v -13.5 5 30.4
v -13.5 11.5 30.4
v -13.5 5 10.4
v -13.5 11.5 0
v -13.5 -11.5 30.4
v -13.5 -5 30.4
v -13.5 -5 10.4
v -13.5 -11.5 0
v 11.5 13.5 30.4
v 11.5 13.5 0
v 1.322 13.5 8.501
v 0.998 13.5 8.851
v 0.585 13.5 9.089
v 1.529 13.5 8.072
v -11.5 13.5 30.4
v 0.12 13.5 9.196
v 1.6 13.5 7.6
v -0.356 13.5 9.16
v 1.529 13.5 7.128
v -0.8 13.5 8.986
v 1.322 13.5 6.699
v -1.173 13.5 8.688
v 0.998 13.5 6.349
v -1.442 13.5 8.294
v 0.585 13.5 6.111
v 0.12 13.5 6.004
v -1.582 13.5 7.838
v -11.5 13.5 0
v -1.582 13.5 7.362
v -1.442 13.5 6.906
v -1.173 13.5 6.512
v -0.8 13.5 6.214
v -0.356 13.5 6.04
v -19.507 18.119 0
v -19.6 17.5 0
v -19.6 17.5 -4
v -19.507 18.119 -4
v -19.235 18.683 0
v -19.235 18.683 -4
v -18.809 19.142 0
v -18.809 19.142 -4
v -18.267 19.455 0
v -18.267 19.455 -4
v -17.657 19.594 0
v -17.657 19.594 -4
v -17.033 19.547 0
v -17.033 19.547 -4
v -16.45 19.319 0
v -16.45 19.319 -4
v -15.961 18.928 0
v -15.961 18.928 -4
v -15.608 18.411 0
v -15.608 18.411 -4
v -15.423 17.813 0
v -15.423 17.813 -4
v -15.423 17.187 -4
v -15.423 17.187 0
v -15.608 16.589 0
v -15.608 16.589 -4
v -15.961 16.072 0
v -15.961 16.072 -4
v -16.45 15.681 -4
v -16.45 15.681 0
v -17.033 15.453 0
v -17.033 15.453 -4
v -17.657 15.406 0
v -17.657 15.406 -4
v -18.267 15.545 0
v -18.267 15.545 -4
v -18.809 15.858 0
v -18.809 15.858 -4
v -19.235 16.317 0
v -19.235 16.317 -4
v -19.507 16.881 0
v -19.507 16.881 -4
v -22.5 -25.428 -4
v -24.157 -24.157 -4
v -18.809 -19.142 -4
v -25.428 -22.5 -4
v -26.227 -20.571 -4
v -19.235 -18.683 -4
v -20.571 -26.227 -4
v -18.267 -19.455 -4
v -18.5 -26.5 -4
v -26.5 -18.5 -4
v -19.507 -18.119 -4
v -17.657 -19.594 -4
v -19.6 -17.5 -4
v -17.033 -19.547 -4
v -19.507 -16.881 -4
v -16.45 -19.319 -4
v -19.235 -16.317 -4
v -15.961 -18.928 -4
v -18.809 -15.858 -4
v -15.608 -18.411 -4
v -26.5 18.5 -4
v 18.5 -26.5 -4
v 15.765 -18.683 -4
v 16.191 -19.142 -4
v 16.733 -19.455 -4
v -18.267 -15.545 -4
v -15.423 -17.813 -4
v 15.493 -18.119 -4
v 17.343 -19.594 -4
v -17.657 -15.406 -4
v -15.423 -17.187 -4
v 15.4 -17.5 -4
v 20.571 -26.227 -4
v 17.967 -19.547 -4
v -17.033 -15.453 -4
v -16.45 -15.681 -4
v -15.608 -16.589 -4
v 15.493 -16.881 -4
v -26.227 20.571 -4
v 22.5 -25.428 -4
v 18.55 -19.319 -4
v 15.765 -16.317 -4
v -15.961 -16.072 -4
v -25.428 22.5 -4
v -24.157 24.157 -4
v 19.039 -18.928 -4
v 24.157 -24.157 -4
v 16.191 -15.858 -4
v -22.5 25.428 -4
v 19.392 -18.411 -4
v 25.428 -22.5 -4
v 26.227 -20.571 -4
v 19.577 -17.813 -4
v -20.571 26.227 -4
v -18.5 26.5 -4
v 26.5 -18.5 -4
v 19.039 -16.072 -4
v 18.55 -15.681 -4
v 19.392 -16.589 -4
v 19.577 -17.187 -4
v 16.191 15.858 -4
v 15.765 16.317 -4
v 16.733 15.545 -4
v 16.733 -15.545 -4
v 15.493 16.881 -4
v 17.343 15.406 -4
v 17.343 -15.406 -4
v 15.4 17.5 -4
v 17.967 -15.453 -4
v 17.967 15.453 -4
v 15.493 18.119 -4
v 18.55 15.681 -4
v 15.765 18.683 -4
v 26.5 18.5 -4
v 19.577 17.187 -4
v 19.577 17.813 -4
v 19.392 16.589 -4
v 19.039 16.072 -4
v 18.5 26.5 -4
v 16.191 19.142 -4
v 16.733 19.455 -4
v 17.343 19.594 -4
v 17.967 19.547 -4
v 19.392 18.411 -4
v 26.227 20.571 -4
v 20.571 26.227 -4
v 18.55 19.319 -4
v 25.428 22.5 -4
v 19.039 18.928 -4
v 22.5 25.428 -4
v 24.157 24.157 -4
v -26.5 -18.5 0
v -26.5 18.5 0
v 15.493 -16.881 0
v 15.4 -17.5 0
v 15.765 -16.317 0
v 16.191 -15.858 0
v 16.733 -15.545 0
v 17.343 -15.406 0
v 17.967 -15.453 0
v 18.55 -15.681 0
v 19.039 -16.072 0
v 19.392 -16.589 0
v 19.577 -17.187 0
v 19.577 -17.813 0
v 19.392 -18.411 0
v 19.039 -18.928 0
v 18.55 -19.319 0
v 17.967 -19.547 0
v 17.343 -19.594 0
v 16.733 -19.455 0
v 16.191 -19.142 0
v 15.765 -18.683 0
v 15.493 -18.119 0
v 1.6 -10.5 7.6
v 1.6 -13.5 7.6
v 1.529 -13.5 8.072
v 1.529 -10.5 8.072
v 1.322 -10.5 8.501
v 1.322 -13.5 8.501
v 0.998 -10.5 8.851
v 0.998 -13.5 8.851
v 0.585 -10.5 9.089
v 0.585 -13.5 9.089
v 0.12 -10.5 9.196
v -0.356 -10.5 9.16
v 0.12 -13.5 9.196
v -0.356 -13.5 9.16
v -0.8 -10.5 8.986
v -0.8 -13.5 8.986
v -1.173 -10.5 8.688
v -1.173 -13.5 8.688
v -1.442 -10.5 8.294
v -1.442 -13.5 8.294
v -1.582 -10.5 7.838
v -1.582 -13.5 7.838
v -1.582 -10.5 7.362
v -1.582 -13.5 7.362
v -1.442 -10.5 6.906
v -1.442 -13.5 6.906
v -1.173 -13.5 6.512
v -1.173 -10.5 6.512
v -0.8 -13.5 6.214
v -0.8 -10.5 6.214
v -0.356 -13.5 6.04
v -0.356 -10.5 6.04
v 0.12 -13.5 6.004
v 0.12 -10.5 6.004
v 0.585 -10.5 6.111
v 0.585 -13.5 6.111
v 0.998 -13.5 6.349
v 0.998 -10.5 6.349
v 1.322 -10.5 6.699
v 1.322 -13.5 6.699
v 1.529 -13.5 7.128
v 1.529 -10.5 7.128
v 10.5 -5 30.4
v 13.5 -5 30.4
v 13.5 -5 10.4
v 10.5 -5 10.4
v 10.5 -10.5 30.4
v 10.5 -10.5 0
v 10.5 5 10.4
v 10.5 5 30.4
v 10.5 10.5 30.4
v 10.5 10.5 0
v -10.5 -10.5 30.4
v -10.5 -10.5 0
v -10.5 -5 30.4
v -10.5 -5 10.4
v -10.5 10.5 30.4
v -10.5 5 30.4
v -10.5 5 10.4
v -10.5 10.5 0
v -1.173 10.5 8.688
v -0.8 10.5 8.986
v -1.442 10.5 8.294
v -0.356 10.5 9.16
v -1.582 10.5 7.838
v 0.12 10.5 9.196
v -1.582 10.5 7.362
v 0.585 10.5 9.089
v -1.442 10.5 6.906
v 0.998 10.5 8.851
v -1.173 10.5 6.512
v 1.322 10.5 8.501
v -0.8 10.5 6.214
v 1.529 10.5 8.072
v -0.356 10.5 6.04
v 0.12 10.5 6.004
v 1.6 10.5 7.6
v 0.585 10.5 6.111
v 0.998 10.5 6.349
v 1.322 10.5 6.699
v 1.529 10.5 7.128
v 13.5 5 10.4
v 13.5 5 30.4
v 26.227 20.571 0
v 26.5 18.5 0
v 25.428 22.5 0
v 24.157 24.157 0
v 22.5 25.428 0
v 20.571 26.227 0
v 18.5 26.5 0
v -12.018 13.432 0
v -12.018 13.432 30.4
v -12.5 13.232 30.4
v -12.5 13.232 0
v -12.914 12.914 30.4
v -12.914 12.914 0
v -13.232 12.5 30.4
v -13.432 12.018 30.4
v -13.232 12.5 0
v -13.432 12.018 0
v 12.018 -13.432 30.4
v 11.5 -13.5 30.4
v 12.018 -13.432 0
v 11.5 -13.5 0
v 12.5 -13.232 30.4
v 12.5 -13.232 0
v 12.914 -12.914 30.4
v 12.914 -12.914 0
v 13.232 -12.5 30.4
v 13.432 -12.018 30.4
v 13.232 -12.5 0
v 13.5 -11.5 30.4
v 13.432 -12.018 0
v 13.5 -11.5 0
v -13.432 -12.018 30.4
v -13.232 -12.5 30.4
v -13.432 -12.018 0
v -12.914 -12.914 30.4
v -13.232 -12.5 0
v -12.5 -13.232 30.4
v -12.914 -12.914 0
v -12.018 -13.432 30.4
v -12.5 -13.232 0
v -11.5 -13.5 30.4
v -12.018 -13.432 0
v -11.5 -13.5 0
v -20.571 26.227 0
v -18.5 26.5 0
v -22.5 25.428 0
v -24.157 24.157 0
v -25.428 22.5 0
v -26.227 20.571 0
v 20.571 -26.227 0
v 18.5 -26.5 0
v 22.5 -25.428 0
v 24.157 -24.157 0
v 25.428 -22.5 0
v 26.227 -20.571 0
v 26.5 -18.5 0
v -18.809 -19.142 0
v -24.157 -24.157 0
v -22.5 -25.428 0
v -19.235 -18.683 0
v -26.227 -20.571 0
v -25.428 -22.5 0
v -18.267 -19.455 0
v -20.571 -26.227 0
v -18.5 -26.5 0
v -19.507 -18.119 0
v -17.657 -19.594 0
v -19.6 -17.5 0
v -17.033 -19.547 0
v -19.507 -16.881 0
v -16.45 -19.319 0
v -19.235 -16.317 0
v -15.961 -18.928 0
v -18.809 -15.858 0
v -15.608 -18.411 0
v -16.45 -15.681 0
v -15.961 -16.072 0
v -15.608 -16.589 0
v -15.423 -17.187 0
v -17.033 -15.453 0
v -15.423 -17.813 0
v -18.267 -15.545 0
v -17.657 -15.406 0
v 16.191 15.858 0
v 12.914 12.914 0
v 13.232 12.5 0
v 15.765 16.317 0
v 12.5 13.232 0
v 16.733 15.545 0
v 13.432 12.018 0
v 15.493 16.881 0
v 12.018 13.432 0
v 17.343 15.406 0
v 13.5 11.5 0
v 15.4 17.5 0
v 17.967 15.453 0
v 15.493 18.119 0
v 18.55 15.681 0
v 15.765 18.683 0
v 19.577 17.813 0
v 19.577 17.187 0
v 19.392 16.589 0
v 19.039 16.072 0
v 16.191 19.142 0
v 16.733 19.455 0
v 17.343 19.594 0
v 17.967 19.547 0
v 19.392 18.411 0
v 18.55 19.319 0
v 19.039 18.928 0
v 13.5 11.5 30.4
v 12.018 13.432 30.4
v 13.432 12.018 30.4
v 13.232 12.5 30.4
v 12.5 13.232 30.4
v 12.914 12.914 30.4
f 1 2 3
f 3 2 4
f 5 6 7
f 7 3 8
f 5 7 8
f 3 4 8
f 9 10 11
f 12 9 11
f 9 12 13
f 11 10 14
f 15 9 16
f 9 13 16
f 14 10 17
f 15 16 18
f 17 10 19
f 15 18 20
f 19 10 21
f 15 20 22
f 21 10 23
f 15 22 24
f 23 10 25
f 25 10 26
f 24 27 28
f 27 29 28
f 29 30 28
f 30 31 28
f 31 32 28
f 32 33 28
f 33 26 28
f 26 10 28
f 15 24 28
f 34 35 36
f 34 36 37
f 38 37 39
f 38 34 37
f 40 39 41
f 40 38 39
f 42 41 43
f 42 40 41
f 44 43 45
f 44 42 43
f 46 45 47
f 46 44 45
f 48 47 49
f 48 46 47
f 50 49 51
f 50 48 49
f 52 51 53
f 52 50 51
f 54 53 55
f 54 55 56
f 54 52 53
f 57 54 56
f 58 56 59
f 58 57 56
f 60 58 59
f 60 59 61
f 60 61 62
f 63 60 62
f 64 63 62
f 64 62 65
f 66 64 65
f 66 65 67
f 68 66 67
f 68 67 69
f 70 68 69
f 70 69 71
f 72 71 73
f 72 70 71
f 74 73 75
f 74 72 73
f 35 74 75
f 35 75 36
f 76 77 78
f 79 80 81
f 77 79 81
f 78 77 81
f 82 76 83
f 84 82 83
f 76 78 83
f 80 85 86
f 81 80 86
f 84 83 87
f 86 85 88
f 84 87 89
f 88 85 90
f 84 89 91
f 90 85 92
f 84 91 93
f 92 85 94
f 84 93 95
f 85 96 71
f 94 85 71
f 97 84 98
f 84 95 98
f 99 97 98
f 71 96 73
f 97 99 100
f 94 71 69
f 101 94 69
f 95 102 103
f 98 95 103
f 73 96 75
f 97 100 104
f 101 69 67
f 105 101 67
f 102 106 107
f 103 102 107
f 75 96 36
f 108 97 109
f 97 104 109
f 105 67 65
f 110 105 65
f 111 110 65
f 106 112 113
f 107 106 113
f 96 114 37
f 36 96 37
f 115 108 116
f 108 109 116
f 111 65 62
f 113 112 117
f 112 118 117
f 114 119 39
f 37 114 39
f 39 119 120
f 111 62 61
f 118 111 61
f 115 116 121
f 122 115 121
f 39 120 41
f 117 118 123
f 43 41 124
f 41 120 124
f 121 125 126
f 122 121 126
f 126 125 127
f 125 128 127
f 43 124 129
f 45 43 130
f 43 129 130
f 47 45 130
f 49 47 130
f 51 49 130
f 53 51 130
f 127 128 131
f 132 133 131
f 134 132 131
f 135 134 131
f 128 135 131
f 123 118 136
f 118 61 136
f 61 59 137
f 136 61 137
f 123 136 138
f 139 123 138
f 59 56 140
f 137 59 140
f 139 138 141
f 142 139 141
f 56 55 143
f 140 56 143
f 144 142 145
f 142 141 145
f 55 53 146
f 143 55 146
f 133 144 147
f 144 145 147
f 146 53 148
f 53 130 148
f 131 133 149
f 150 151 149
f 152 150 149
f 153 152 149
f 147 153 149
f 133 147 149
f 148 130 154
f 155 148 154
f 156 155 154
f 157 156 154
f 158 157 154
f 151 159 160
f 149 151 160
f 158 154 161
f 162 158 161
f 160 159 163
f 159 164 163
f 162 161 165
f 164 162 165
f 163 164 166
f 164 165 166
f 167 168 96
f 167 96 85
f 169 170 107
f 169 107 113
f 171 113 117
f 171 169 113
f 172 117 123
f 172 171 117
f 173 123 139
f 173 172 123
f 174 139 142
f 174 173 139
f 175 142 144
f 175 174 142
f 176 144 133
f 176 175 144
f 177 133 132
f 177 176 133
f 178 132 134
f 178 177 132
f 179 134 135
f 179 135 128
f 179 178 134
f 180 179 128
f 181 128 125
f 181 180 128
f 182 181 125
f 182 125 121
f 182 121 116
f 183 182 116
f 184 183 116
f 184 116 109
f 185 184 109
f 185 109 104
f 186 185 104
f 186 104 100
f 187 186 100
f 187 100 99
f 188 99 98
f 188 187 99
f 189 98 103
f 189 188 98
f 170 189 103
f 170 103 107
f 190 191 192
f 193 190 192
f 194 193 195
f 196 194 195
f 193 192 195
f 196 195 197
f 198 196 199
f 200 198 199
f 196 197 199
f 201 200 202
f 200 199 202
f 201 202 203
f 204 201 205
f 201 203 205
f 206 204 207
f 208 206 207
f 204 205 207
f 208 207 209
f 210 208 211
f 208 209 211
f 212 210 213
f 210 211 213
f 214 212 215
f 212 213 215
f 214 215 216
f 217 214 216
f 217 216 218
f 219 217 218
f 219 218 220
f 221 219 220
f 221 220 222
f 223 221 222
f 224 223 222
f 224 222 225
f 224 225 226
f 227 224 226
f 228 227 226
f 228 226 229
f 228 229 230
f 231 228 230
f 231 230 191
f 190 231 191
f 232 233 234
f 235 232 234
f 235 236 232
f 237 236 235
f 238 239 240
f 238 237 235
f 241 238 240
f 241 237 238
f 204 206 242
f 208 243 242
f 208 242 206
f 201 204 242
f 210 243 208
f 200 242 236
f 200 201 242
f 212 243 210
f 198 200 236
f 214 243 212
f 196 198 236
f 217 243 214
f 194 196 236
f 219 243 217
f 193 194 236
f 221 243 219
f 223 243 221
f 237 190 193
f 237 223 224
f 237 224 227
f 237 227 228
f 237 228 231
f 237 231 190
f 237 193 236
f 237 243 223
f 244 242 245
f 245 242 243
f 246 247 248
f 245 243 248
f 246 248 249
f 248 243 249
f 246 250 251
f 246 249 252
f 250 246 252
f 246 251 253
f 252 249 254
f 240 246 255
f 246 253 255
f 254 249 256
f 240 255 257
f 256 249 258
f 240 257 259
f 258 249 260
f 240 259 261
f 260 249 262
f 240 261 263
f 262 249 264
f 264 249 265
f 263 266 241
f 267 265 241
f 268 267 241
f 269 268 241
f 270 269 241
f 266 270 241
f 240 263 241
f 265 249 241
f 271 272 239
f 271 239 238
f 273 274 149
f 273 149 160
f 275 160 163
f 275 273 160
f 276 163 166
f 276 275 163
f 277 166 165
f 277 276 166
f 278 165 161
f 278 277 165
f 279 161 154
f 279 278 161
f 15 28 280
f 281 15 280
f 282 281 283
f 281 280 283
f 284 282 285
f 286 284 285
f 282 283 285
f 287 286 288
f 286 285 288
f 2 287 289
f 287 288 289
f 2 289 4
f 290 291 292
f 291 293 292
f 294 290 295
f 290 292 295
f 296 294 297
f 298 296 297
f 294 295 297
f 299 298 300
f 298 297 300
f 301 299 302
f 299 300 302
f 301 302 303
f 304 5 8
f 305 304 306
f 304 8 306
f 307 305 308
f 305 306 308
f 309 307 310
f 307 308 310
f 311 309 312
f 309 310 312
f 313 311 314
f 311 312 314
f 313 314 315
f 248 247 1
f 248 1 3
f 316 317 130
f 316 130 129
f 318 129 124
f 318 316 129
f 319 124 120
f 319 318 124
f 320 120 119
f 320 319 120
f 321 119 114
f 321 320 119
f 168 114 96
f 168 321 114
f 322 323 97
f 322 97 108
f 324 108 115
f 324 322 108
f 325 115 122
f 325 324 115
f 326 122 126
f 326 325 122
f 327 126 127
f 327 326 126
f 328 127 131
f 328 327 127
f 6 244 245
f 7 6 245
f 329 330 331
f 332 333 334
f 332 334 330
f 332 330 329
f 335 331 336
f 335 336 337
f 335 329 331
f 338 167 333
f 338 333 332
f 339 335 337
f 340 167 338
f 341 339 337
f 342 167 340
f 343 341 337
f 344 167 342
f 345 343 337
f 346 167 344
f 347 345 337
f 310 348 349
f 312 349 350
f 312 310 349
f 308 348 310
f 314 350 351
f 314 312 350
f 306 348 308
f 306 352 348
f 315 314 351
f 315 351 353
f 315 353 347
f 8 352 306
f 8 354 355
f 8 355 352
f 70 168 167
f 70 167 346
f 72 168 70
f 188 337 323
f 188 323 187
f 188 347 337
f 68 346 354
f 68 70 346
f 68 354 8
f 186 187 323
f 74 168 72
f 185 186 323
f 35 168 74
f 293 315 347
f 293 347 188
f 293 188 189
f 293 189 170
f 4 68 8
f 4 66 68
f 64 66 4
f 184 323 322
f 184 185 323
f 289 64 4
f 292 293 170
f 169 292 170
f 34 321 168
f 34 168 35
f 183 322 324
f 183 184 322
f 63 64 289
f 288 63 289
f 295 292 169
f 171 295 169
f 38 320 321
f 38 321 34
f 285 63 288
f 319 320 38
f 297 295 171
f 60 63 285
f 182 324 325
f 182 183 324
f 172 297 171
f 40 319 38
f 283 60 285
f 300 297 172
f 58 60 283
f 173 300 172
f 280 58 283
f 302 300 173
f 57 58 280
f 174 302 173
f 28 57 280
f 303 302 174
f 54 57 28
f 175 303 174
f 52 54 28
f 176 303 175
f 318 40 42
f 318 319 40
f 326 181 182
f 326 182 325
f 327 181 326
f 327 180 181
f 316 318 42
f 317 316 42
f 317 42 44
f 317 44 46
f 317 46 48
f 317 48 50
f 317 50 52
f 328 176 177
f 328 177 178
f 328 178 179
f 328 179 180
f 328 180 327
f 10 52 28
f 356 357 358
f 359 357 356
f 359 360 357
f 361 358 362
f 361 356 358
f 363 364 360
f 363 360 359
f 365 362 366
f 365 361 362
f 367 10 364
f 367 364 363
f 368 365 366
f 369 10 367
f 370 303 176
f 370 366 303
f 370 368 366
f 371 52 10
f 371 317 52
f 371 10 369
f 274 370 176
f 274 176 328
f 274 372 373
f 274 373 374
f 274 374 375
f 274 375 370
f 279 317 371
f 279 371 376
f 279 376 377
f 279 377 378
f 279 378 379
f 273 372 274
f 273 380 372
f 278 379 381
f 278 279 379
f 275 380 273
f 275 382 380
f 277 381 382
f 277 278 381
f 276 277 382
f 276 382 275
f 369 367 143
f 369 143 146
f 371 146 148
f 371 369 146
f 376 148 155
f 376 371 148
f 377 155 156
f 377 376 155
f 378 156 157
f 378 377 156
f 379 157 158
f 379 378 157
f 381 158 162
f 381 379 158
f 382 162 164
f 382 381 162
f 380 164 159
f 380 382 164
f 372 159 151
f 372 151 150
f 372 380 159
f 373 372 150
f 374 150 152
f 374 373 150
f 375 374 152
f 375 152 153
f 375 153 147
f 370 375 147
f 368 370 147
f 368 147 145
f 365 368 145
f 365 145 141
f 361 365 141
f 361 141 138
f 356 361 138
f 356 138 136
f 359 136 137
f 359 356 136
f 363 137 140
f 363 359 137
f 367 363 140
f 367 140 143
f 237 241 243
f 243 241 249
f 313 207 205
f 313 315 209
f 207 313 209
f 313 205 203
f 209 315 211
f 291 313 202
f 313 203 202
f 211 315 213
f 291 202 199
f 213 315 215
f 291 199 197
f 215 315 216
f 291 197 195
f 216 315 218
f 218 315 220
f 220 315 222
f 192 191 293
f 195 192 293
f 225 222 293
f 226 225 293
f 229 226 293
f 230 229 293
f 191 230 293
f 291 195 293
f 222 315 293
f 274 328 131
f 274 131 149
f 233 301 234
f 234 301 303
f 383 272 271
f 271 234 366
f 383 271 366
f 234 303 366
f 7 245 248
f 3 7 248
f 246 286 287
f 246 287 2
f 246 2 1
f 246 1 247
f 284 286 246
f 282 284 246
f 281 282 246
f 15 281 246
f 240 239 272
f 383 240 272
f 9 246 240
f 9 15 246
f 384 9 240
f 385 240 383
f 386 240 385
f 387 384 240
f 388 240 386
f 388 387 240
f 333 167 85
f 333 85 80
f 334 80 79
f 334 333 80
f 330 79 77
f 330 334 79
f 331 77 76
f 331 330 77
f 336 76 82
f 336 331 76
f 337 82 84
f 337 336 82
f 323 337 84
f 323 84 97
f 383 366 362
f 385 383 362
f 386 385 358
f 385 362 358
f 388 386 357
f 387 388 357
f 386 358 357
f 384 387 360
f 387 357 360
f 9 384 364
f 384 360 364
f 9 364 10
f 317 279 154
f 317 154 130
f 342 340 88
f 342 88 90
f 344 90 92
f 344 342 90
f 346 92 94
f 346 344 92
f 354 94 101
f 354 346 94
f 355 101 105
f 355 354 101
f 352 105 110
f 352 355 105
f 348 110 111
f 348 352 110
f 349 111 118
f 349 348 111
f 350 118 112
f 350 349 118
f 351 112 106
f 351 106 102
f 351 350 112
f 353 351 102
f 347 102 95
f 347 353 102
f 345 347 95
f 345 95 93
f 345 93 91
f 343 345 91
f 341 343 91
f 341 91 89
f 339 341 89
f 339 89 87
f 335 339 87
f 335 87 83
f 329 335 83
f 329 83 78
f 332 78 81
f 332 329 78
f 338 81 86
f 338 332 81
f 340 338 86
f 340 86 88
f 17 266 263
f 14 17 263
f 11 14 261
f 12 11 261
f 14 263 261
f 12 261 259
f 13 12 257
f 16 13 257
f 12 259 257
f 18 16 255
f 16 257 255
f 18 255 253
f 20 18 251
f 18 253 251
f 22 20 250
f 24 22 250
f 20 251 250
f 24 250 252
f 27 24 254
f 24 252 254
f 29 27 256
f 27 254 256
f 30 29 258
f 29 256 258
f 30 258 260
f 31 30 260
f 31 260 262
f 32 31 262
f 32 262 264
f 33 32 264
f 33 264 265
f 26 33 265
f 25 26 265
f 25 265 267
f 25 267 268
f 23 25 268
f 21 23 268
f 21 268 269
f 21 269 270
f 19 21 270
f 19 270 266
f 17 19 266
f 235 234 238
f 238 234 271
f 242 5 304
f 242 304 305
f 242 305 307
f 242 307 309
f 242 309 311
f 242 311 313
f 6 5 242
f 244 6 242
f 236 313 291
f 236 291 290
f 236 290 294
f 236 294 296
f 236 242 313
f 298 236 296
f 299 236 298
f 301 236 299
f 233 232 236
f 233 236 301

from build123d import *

# Parameters (mm, degrees)
SKETCH1_W           = 27
SKETCH1_H           = 27
SKETCH1_W_2         = 21
SKETCH1_H_2         = 21
BOSS_EXTRUDE1_DEPTH = 15.2
SKETCH2_R           = 1.6
CUT_EXTRUDE1_DEPTH  = 34.797780992
SKETCH5_R           = 2.1
SKETCH5_W           = 27
SKETCH5_H           = 27
SKETCH5_W_2         = 21
SKETCH5_H_2         = 21
BOSS_EXTRUDE3_DEPTH = 4
FILLET2_R           = 2
BOSS_EXTRUDE5_DEPTH = 4
SKETCH8_W           = 21
SKETCH8_H           = 21
BOSS_EXTRUDE7_DEPTH = 15.2
SKETCH9_W           = 20
SKETCH9_H           = 10
CUT_EXTRUDE2_DEPTH  = 57.801496459


with BuildPart() as part:
    # Sketch1 → Boss-Extrude1 (new body)
    with BuildSketch(Plane.XY):
        Rectangle(SKETCH1_W, SKETCH1_H)
        Rectangle(SKETCH1_W_2, SKETCH1_H_2, mode=Mode.SUBTRACT)
    extrude(amount=BOSS_EXTRUDE1_DEPTH)

    # Sketch2 → Cut-Extrude1 (cut, through all)
    with BuildSketch(Plane.XZ.offset(13.5)):
        with Locations((0, 7.6)):
            Circle(SKETCH2_R)
    extrude(amount=-CUT_EXTRUDE1_DEPTH, mode=Mode.SUBTRACT)

    # Sketch5 → Boss-Extrude3 (add)
    with BuildSketch(Plane(origin=(0, 0, 0), x_dir=(-1, 0, 0), z_dir=(0, 0, -1))):
        with BuildLine():
            Line((18.5, 21.5), (-18.5, 21.5))
            ThreePointArc((-18.5, 21.5), (-20.621320344, 20.621320344), (-21.5, 18.5))
            Line((-21.5, 18.5), (-21.5, -18.5))
            ThreePointArc((-21.5, -18.5), (-20.621320344, -20.621320344), (-18.5, -21.5))
            Line((-18.5, -21.5), (18.5, -21.5))
            ThreePointArc((18.5, -21.5), (20.621320344, -20.621320344), (21.5, -18.5))
            Line((21.5, -18.5), (21.5, 18.5))
            ThreePointArc((21.5, 18.5), (20.621320344, 20.621320344), (18.5, 21.5))
        make_face()
        with Locations((-17.5, 17.5)):
            Circle(SKETCH5_R, mode=Mode.SUBTRACT)
        with Locations((-17.5, -17.5)):
            Circle(SKETCH5_R, mode=Mode.SUBTRACT)
        with Locations((17.5, -17.5)):
            Circle(SKETCH5_R, mode=Mode.SUBTRACT)
        with Locations((17.5, 17.5)):
            Circle(SKETCH5_R, mode=Mode.SUBTRACT)
        Rectangle(SKETCH5_W, SKETCH5_H, mode=Mode.SUBTRACT)
        Rectangle(SKETCH5_W, SKETCH5_H)
        Rectangle(SKETCH5_W_2, SKETCH5_H_2, mode=Mode.SUBTRACT)
        Rectangle(SKETCH5_W_2, SKETCH5_H_2)
    extrude(amount=BOSS_EXTRUDE3_DEPTH)

    # Fillet2
    fillet2_edges = [part.edges().sort_by_distance(p)[0] for p in [
        (13.5, -13.5, 7.6),
        (-13.5, -13.5, 7.6),
        (-13.5, 13.5, 7.6),
        (13.5, 13.5, 7.6),
    ]]
    fillet(fillet2_edges, radius=FILLET2_R)

    # Sketch7 → Boss-Extrude5 (add)
    with BuildSketch(Plane.XY):
        with BuildLine():
            Line((18.5, 26.5), (-18.5, 26.5))
            ThreePointArc((-18.5, 26.5), (-24.156854249, 24.156854249), (-26.5, 18.5))
            Line((-26.5, 18.5), (-26.5, -18.5))
            ThreePointArc((-26.5, -18.5), (-24.156854249, -24.156854249), (-18.5, -26.5))
            Line((-18.5, -26.5), (18.5, -26.5))
            ThreePointArc((18.5, -26.5), (24.156854249, -24.156854249), (26.5, -18.5))
            Line((26.5, -18.5), (26.5, 18.5))
            ThreePointArc((26.5, 18.5), (24.156854249, 24.156854249), (18.5, 26.5))
        make_face()
        with BuildLine():
            Line((18.5, 21.5), (-18.5, 21.5))
            ThreePointArc((-18.5, 21.5), (-20.621320344, 20.621320344), (-21.5, 18.5))
            Line((-21.5, 18.5), (-21.5, -18.5))
            ThreePointArc((-21.5, -18.5), (-20.621320344, -20.621320344), (-18.5, -21.5))
            Line((-18.5, -21.5), (18.5, -21.5))
            ThreePointArc((18.5, -21.5), (20.621320344, -20.621320344), (21.5, -18.5))
            Line((21.5, -18.5), (21.5, 18.5))
            ThreePointArc((21.5, 18.5), (20.621320344, 20.621320344), (18.5, 21.5))
        make_face(mode=Mode.SUBTRACT)
    extrude(amount=-BOSS_EXTRUDE5_DEPTH)

    # Sketch8 → Boss-Extrude7 (add)
    with BuildSketch(Plane.XY.offset(15.2)):
        with BuildLine():
            ThreePointArc((-11.5, 13.5), (-12.914213562, 12.914213562), (-13.5, 11.5))
            Line((-13.5, 11.5), (-13.5, -11.5))
            ThreePointArc((-13.5, -11.5), (-12.914213562, -12.914213562), (-11.5, -13.5))
            Line((-11.5, -13.5), (11.5, -13.5))
            ThreePointArc((11.5, -13.5), (12.914213562, -12.914213562), (13.5, -11.5))
            Line((13.5, -11.5), (13.5, 11.5))
            ThreePointArc((13.5, 11.5), (12.914213562, 12.914213562), (11.5, 13.5))
            Line((11.5, 13.5), (-11.5, 13.5))
        make_face()
        Rectangle(SKETCH8_W, SKETCH8_H, mode=Mode.SUBTRACT)
    extrude(amount=BOSS_EXTRUDE7_DEPTH)

    # Sketch9 → Cut-Extrude2 (cut, through all)
    with BuildSketch(Plane(origin=(13.5, 0, 0), x_dir=(0, 0, -1), z_dir=(1, 0, 0))):
        with Locations((-20.4, 0)):
            Rectangle(SKETCH9_W, SKETCH9_H)
    extrude(amount=-CUT_EXTRUDE2_DEPTH, mode=Mode.SUBTRACT)


solid = part.part
